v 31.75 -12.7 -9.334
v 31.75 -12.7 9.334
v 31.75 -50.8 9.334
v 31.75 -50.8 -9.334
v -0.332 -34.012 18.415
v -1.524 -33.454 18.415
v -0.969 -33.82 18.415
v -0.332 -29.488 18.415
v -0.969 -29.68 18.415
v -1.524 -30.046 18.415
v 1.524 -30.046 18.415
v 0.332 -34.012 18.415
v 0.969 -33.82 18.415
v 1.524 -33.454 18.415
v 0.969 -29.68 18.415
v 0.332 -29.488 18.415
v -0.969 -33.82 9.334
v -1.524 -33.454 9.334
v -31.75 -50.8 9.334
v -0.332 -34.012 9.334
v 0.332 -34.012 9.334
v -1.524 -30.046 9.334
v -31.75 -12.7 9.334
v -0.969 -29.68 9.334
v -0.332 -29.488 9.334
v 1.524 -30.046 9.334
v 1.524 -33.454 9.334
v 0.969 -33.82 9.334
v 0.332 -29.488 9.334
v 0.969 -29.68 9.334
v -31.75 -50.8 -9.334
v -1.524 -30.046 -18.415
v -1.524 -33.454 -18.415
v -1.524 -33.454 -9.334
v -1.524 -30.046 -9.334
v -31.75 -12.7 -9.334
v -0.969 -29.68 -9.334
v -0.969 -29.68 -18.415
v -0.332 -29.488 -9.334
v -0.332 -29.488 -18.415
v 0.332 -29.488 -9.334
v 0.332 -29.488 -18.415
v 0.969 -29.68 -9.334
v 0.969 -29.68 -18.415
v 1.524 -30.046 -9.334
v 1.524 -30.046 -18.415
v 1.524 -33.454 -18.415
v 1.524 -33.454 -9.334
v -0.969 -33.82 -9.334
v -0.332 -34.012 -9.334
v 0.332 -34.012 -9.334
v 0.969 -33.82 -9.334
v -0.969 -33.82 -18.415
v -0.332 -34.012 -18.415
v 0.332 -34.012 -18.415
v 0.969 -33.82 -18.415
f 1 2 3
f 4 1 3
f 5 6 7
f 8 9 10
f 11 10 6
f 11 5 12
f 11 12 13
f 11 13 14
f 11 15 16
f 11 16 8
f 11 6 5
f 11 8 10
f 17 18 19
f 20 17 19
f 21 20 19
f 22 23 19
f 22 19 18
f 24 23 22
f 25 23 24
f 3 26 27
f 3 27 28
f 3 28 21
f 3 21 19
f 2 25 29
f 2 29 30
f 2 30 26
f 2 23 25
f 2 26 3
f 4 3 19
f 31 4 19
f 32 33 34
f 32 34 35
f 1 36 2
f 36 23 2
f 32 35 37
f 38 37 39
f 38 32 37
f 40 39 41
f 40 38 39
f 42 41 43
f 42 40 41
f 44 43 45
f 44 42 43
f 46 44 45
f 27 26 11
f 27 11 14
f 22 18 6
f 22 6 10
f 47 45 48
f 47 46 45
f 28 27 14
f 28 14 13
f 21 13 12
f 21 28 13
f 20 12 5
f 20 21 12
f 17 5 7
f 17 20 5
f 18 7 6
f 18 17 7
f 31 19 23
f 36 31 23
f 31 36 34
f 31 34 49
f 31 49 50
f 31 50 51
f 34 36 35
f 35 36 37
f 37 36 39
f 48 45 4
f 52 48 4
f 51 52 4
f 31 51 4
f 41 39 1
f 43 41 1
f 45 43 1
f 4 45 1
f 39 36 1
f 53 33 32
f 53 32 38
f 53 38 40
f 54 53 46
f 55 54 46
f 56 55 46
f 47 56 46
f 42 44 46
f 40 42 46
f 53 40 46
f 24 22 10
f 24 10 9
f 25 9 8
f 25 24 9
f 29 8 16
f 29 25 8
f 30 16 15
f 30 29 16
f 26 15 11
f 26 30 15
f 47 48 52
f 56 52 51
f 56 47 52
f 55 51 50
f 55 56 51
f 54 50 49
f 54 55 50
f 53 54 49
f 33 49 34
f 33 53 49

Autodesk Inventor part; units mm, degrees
ref_plane "YZ Plane" through (0, 0, 0) normal (1, 0, 0) x (0, 1, 0)
ref_plane "XZ Plane" through (0, 0, 0) normal (0, 1, 0) x (-1, 0, 0)
ref_plane "XY Plane" through (0, 0, 0) normal (0, 0, 1) x (1, 0, 0)
sketch "Sketch1" plane through (0, 0, 0) normal (0, 0, 1) x (1, 0, 0)
  arc A0 (1.778, -29.9361) -> (-1.778, -29.9361) centre (0, -31.75) ccw construction
  line L0 (1.778, -29.9361) -> (1.778, -33.5639) construction
  arc A1 (-1.778, -33.5639) -> (1.778, -33.5639) centre (0, -31.75) ccw construction
  line L1 (-1.778, -33.5639) -> (-1.778, -29.9361) construction
  line L2 (1.778, -29.9361) -> (1.778, -33.5639) construction
  line L3 (-1.778, -29.9361) -> (-1.778, -33.5639) construction
  arc A2 (1.778, -29.9361) -> (-1.778, -29.9361) centre (0, -31.75) ccw construction
  arc A3 (-1.778, -33.5639) -> (1.778, -33.5639) centre (0, -31.75) ccw construction
  arc A4 (1.524, -30.0461) -> (-1.524, -30.0461) centre (0, -31.75) ccw
  line L4 (1.524, -30.0461) -> (1.524, -33.4539)
  arc A5 (-1.524, -33.4539) -> (1.524, -33.4539) centre (0, -31.75) ccw
  line L5 (-1.524, -33.4539) -> (-1.524, -30.0461)
  point P0 (0, 0)
  point P1 (0, -34.29)
  point P2 (0, -29.21)
  dimension "d0" = 0.254
extrude "Extrusion1" add sketch "Sketch1" along normal mid plane 36.83
ref_plane "Work Plane1" through (0, 0, 0) normal (0, 0, 1) x (1, 0, 0)
sketch "Sketch2" plane through (0, 0, 0) normal (0, 0, 1) x (1, 0, 0)
  line L0 (31.75, -50.8) -> (-31.75, -50.8)
  line L1 (-31.75, -50.8) -> (-31.75, -12.7)
  line L2 (-31.75, -12.7) -> (31.75, -12.7)
  line L3 (31.75, -12.7) -> (31.75, -50.8)
  line L4 (31.75, -50.8) -> (-31.75, -12.7) construction
  line L5 (-31.75, -50.8) -> (31.75, -12.7) construction
  circle A0 centre (0, -31.75) radius 5.715 projected
  dimension "d5" = 63.5
  dimension "d6" = 38.1
extrude "Extrusion2" add sketch "Sketch2" along normal mid plane 18.669 contours L0 L1 L2 L3 | A0
properties part number "Geared_Motor"
